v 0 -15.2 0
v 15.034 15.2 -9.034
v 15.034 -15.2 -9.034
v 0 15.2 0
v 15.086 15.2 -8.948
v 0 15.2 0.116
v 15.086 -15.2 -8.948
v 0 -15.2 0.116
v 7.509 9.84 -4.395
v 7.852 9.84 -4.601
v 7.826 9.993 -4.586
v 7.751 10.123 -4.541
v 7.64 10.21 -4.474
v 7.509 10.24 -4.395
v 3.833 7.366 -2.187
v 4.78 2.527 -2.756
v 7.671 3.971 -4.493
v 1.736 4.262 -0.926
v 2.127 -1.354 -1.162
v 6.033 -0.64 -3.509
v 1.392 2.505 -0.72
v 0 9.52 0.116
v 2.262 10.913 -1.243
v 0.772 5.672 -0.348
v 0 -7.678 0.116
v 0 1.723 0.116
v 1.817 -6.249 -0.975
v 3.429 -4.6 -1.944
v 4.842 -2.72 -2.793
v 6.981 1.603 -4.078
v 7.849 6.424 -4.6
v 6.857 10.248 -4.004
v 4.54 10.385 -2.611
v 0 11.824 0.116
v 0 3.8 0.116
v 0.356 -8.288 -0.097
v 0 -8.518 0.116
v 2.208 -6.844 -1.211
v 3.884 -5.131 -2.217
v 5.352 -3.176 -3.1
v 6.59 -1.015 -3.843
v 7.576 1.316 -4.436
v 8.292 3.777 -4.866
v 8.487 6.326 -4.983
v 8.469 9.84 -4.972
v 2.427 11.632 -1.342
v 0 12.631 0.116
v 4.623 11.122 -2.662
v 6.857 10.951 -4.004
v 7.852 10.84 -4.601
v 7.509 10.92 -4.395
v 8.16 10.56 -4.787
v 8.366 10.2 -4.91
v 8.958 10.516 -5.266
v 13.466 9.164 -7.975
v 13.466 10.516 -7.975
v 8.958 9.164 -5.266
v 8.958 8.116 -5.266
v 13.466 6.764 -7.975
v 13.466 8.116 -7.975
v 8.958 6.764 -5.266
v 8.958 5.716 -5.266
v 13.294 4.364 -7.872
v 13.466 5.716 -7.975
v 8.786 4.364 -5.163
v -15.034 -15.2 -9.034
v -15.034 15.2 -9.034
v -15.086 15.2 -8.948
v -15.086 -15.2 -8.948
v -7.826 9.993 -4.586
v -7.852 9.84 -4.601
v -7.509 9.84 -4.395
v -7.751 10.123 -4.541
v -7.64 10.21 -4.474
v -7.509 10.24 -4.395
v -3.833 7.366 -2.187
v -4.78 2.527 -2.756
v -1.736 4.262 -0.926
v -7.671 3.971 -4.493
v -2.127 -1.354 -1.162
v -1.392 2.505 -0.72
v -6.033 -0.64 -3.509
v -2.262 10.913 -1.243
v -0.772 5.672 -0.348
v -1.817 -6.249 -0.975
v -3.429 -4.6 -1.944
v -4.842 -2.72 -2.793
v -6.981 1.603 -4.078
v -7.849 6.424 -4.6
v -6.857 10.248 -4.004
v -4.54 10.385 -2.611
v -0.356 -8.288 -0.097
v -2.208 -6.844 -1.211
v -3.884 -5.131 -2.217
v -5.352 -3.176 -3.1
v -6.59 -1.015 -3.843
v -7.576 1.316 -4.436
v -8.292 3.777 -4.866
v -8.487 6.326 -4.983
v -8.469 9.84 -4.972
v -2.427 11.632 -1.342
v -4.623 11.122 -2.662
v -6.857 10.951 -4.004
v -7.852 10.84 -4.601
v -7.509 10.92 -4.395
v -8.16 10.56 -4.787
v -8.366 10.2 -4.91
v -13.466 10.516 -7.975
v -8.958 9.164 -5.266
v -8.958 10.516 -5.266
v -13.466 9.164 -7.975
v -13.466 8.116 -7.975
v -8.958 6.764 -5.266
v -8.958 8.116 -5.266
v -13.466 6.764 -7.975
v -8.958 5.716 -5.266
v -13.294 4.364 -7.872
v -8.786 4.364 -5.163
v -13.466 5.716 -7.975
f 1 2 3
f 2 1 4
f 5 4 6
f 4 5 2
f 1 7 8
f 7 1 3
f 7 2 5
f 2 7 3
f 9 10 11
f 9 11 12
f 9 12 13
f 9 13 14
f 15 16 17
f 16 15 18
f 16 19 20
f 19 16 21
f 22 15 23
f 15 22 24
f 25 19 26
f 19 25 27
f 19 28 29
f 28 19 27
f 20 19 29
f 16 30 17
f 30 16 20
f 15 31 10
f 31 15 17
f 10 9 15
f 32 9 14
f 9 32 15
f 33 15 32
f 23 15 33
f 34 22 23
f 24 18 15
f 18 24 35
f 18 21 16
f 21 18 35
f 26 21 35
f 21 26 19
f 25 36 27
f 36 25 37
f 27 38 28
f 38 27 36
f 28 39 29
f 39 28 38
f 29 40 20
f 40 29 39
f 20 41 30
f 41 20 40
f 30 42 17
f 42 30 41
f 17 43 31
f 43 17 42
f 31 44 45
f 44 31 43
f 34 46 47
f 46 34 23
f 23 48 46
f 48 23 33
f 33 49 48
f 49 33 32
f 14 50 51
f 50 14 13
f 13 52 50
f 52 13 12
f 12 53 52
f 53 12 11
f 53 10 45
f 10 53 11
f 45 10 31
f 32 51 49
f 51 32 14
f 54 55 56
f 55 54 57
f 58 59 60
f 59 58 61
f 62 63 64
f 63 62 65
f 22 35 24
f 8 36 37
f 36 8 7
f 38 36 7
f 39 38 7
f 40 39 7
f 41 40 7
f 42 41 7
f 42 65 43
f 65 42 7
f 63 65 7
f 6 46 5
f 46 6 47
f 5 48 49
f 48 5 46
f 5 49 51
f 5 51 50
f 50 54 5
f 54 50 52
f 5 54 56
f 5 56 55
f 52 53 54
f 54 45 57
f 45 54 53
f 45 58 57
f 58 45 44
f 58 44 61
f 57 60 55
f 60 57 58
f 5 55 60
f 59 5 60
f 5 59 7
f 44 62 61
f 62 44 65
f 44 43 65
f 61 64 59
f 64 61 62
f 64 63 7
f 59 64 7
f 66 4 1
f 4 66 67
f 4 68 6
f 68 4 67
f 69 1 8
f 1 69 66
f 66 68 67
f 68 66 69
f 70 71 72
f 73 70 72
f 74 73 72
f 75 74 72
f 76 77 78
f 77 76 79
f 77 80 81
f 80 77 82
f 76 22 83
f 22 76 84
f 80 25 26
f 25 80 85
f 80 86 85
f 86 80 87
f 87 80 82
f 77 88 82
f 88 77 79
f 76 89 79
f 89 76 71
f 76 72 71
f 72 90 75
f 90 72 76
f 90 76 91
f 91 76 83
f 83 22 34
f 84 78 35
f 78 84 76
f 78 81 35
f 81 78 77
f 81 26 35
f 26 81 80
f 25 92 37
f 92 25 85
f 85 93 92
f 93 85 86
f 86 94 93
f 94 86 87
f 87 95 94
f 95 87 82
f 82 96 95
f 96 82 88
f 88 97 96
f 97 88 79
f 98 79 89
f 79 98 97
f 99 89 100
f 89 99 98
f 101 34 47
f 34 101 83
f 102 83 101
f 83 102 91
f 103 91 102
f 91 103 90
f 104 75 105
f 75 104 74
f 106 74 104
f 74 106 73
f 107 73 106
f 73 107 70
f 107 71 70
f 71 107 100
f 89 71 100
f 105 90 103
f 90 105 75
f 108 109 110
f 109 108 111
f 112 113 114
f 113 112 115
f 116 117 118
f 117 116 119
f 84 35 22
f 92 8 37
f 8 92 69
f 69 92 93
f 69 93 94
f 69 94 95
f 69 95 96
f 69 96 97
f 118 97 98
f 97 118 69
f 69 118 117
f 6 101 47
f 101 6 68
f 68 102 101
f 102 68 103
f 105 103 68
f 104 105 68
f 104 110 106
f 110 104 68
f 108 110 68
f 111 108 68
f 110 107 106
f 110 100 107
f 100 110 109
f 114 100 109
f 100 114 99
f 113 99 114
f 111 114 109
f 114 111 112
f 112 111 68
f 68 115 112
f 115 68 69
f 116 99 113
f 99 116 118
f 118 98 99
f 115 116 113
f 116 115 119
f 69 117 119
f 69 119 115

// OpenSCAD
// file: ../p/1-4disc.scad
use <../lib.scad>
function ldraw_lib__1_4disc() = [
// 0 Disc 0.25
// 0 Name: 1-4disc.dat
// 0 Author: James Jessiman
// 0 !LDRAW_ORG Primitive UPDATE 2002-02
// 0 !LICENSE Licensed under CC BY 4.0 : see CAreadme.txt
// 
// 0 BFC CERTIFY CCW
  [0,"BFC","CERTIFY"],
  [0,"BFC","CCW"],
// 
// 0 !HISTORY 2002-03-23 [sbliss] Added BFC statement.
// 0 !HISTORY 2002-04-25 [PTadmin] Official Update 2002-02
// 0 !HISTORY 2007-06-22 [PTadmin] Header formatted for Contributor Agreement
// 0 !HISTORY 2008-07-01 [PTadmin] Official Update 2008-01
// 
// 
// 3 16 0 0 0 1 0 0 0.9239 0 0.3827
  [3,16,0,0,0,1,0,0,0.9239,0,0.3827],
// 3 16 0 0 0 0.9239 0 0.3827 0.7071 0 0.7071
  [3,16,0,0,0,0.9239,0,0.3827,0.7071,0,0.7071],
// 3 16 0 0 0 0.7071 0 0.7071 0.3827 0 0.9239
  [3,16,0,0,0,0.7071,0,0.7071,0.3827,0,0.9239],
// 3 16 0 0 0 0.3827 0 0.9239 0 0 1
  [3,16,0,0,0,0.3827,0,0.9239,0,0,1],
// 0
];
module ldraw_lib__1_4disc(step=0, col=false, unit=2/5, alt=false, line=0.2, solid=!$preview)
    makepoly(ldraw_lib__1_4disc(), step=step, col=col, unit=unit, alt=alt, line=line, solid=solid);
ldraw_lib__1_4disc(line=0.2);
// main file
use <../lib.scad>
use <s/4616559ps4.scad>
function ldraw_lib__4616559fc01() = [
// 0 Sticker  3.8 x  4.4 with Maersk Blazon (Formed)
// 0 Name: 4616559fc01.dat
// 0 Author: J.C. Tchang [tchang]
// 0 !LDRAW_ORG Part UPDATE 2013-01
// 0 !LICENSE Licensed under CC BY 4.0 : see CAreadme.txt
// 
// 0 BFC CERTIFY CCW
  [0,"BFC","CERTIFY"],
  [0,"BFC","CCW"],
// 
// 0 !KEYWORDS Set 10219
// 
// 0 !HISTORY 2013-07-21 [PTadmin] Official Update 2013-01
// 
// 
// 4 16 37.586 22.585 38 37.586 22.585 -38 0 0 -38 0 0 38
  [4,16,37.586,22.585,38,37.586,22.585,-38,0,0,-38,0,0,38],
// 4 16 0 -0.291 38 37.715 22.371 38 37.586 22.585 38 0 0 38
  [4,16,0,-0.291,38,37.715,22.371,38,37.586,22.585,38,0,0,38],
// 4 16 37.715 22.371 -38 0 -0.291 -38 0 0 -38 37.586 22.585 -38
  [4,16,37.715,22.371,-38,0,-0.291,-38,0,0,-38,37.586,22.585,-38],
// 4 16 37.715 22.371 38 37.715 22.371 -38 37.586 22.585 -38 37.586 22.585 38
  [4,16,37.715,22.371,38,37.715,22.371,-38,37.586,22.585,-38,37.586,22.585,38],
// 1 16 0 -0.291 0 0.857167 -0.515038 0 0.515038 0.857167 0 0 0 1 s\4616559ps4.dat
  [1,16,0,-0.291,0,0.857167,-0.515038,0,0.515038,0.857167,0,0,0,1, ldraw_lib__s__4616559ps4()],
// 0 //
// 4 16 0 0 38 0 0 -38 -37.586 22.585 -38 -37.586 22.585 38
  [4,16,0,0,38,0,0,-38,-37.586,22.585,-38,-37.586,22.585,38],
// 4 16 0 0 38 -37.586 22.585 38 -37.715 22.371 38 0 -0.291 38
  [4,16,0,0,38,-37.586,22.585,38,-37.715,22.371,38,0,-0.291,38],
// 4 16 -37.586 22.585 -38 0 0 -38 0 -0.291 -38 -37.715 22.371 -38
  [4,16,-37.586,22.585,-38,0,0,-38,0,-0.291,-38,-37.715,22.371,-38],
// 4 16 -37.586 22.585 38 -37.586 22.585 -38 -37.715 22.371 -38 -37.715 22.371 38
  [4,16,-37.586,22.585,38,-37.586,22.585,-38,-37.715,22.371,-38,-37.715,22.371,38],
// 1 16 0 -0.291 0 -0.857167 0.515038 0 0.515038 0.857167 0 0 0 1 s\4616559ps4.dat
  [1,16,0,-0.291,0,-0.857167,0.515038,0,0.515038,0.857167,0,0,0,1, ldraw_lib__s__4616559ps4()],
// 0 //
// 5 24 0 0 38 0 0 -38 37.586 22.585 38 -37.586 22.585 38
  [5,24,0,0,38,0,0,-38,37.586,22.585,38,-37.586,22.585,38],
// 5 24 0 -0.29166 38 0 -0.29166 -38 37.715 22.371 38 -37.715 22.371 38
  [5,24,0,-0.29166,38,0,-0.29166,-38,37.715,22.371,38,-37.715,22.371,38],
];
module ldraw_lib__4616559fc01(step=0, col=false, unit=2/5, alt=false, line=0.2, solid=!$preview)
    makepoly(ldraw_lib__4616559fc01(), step=step, col=col, unit=unit, alt=alt, line=line, solid=solid);
ldraw_lib__4616559fc01(line=0.2);
